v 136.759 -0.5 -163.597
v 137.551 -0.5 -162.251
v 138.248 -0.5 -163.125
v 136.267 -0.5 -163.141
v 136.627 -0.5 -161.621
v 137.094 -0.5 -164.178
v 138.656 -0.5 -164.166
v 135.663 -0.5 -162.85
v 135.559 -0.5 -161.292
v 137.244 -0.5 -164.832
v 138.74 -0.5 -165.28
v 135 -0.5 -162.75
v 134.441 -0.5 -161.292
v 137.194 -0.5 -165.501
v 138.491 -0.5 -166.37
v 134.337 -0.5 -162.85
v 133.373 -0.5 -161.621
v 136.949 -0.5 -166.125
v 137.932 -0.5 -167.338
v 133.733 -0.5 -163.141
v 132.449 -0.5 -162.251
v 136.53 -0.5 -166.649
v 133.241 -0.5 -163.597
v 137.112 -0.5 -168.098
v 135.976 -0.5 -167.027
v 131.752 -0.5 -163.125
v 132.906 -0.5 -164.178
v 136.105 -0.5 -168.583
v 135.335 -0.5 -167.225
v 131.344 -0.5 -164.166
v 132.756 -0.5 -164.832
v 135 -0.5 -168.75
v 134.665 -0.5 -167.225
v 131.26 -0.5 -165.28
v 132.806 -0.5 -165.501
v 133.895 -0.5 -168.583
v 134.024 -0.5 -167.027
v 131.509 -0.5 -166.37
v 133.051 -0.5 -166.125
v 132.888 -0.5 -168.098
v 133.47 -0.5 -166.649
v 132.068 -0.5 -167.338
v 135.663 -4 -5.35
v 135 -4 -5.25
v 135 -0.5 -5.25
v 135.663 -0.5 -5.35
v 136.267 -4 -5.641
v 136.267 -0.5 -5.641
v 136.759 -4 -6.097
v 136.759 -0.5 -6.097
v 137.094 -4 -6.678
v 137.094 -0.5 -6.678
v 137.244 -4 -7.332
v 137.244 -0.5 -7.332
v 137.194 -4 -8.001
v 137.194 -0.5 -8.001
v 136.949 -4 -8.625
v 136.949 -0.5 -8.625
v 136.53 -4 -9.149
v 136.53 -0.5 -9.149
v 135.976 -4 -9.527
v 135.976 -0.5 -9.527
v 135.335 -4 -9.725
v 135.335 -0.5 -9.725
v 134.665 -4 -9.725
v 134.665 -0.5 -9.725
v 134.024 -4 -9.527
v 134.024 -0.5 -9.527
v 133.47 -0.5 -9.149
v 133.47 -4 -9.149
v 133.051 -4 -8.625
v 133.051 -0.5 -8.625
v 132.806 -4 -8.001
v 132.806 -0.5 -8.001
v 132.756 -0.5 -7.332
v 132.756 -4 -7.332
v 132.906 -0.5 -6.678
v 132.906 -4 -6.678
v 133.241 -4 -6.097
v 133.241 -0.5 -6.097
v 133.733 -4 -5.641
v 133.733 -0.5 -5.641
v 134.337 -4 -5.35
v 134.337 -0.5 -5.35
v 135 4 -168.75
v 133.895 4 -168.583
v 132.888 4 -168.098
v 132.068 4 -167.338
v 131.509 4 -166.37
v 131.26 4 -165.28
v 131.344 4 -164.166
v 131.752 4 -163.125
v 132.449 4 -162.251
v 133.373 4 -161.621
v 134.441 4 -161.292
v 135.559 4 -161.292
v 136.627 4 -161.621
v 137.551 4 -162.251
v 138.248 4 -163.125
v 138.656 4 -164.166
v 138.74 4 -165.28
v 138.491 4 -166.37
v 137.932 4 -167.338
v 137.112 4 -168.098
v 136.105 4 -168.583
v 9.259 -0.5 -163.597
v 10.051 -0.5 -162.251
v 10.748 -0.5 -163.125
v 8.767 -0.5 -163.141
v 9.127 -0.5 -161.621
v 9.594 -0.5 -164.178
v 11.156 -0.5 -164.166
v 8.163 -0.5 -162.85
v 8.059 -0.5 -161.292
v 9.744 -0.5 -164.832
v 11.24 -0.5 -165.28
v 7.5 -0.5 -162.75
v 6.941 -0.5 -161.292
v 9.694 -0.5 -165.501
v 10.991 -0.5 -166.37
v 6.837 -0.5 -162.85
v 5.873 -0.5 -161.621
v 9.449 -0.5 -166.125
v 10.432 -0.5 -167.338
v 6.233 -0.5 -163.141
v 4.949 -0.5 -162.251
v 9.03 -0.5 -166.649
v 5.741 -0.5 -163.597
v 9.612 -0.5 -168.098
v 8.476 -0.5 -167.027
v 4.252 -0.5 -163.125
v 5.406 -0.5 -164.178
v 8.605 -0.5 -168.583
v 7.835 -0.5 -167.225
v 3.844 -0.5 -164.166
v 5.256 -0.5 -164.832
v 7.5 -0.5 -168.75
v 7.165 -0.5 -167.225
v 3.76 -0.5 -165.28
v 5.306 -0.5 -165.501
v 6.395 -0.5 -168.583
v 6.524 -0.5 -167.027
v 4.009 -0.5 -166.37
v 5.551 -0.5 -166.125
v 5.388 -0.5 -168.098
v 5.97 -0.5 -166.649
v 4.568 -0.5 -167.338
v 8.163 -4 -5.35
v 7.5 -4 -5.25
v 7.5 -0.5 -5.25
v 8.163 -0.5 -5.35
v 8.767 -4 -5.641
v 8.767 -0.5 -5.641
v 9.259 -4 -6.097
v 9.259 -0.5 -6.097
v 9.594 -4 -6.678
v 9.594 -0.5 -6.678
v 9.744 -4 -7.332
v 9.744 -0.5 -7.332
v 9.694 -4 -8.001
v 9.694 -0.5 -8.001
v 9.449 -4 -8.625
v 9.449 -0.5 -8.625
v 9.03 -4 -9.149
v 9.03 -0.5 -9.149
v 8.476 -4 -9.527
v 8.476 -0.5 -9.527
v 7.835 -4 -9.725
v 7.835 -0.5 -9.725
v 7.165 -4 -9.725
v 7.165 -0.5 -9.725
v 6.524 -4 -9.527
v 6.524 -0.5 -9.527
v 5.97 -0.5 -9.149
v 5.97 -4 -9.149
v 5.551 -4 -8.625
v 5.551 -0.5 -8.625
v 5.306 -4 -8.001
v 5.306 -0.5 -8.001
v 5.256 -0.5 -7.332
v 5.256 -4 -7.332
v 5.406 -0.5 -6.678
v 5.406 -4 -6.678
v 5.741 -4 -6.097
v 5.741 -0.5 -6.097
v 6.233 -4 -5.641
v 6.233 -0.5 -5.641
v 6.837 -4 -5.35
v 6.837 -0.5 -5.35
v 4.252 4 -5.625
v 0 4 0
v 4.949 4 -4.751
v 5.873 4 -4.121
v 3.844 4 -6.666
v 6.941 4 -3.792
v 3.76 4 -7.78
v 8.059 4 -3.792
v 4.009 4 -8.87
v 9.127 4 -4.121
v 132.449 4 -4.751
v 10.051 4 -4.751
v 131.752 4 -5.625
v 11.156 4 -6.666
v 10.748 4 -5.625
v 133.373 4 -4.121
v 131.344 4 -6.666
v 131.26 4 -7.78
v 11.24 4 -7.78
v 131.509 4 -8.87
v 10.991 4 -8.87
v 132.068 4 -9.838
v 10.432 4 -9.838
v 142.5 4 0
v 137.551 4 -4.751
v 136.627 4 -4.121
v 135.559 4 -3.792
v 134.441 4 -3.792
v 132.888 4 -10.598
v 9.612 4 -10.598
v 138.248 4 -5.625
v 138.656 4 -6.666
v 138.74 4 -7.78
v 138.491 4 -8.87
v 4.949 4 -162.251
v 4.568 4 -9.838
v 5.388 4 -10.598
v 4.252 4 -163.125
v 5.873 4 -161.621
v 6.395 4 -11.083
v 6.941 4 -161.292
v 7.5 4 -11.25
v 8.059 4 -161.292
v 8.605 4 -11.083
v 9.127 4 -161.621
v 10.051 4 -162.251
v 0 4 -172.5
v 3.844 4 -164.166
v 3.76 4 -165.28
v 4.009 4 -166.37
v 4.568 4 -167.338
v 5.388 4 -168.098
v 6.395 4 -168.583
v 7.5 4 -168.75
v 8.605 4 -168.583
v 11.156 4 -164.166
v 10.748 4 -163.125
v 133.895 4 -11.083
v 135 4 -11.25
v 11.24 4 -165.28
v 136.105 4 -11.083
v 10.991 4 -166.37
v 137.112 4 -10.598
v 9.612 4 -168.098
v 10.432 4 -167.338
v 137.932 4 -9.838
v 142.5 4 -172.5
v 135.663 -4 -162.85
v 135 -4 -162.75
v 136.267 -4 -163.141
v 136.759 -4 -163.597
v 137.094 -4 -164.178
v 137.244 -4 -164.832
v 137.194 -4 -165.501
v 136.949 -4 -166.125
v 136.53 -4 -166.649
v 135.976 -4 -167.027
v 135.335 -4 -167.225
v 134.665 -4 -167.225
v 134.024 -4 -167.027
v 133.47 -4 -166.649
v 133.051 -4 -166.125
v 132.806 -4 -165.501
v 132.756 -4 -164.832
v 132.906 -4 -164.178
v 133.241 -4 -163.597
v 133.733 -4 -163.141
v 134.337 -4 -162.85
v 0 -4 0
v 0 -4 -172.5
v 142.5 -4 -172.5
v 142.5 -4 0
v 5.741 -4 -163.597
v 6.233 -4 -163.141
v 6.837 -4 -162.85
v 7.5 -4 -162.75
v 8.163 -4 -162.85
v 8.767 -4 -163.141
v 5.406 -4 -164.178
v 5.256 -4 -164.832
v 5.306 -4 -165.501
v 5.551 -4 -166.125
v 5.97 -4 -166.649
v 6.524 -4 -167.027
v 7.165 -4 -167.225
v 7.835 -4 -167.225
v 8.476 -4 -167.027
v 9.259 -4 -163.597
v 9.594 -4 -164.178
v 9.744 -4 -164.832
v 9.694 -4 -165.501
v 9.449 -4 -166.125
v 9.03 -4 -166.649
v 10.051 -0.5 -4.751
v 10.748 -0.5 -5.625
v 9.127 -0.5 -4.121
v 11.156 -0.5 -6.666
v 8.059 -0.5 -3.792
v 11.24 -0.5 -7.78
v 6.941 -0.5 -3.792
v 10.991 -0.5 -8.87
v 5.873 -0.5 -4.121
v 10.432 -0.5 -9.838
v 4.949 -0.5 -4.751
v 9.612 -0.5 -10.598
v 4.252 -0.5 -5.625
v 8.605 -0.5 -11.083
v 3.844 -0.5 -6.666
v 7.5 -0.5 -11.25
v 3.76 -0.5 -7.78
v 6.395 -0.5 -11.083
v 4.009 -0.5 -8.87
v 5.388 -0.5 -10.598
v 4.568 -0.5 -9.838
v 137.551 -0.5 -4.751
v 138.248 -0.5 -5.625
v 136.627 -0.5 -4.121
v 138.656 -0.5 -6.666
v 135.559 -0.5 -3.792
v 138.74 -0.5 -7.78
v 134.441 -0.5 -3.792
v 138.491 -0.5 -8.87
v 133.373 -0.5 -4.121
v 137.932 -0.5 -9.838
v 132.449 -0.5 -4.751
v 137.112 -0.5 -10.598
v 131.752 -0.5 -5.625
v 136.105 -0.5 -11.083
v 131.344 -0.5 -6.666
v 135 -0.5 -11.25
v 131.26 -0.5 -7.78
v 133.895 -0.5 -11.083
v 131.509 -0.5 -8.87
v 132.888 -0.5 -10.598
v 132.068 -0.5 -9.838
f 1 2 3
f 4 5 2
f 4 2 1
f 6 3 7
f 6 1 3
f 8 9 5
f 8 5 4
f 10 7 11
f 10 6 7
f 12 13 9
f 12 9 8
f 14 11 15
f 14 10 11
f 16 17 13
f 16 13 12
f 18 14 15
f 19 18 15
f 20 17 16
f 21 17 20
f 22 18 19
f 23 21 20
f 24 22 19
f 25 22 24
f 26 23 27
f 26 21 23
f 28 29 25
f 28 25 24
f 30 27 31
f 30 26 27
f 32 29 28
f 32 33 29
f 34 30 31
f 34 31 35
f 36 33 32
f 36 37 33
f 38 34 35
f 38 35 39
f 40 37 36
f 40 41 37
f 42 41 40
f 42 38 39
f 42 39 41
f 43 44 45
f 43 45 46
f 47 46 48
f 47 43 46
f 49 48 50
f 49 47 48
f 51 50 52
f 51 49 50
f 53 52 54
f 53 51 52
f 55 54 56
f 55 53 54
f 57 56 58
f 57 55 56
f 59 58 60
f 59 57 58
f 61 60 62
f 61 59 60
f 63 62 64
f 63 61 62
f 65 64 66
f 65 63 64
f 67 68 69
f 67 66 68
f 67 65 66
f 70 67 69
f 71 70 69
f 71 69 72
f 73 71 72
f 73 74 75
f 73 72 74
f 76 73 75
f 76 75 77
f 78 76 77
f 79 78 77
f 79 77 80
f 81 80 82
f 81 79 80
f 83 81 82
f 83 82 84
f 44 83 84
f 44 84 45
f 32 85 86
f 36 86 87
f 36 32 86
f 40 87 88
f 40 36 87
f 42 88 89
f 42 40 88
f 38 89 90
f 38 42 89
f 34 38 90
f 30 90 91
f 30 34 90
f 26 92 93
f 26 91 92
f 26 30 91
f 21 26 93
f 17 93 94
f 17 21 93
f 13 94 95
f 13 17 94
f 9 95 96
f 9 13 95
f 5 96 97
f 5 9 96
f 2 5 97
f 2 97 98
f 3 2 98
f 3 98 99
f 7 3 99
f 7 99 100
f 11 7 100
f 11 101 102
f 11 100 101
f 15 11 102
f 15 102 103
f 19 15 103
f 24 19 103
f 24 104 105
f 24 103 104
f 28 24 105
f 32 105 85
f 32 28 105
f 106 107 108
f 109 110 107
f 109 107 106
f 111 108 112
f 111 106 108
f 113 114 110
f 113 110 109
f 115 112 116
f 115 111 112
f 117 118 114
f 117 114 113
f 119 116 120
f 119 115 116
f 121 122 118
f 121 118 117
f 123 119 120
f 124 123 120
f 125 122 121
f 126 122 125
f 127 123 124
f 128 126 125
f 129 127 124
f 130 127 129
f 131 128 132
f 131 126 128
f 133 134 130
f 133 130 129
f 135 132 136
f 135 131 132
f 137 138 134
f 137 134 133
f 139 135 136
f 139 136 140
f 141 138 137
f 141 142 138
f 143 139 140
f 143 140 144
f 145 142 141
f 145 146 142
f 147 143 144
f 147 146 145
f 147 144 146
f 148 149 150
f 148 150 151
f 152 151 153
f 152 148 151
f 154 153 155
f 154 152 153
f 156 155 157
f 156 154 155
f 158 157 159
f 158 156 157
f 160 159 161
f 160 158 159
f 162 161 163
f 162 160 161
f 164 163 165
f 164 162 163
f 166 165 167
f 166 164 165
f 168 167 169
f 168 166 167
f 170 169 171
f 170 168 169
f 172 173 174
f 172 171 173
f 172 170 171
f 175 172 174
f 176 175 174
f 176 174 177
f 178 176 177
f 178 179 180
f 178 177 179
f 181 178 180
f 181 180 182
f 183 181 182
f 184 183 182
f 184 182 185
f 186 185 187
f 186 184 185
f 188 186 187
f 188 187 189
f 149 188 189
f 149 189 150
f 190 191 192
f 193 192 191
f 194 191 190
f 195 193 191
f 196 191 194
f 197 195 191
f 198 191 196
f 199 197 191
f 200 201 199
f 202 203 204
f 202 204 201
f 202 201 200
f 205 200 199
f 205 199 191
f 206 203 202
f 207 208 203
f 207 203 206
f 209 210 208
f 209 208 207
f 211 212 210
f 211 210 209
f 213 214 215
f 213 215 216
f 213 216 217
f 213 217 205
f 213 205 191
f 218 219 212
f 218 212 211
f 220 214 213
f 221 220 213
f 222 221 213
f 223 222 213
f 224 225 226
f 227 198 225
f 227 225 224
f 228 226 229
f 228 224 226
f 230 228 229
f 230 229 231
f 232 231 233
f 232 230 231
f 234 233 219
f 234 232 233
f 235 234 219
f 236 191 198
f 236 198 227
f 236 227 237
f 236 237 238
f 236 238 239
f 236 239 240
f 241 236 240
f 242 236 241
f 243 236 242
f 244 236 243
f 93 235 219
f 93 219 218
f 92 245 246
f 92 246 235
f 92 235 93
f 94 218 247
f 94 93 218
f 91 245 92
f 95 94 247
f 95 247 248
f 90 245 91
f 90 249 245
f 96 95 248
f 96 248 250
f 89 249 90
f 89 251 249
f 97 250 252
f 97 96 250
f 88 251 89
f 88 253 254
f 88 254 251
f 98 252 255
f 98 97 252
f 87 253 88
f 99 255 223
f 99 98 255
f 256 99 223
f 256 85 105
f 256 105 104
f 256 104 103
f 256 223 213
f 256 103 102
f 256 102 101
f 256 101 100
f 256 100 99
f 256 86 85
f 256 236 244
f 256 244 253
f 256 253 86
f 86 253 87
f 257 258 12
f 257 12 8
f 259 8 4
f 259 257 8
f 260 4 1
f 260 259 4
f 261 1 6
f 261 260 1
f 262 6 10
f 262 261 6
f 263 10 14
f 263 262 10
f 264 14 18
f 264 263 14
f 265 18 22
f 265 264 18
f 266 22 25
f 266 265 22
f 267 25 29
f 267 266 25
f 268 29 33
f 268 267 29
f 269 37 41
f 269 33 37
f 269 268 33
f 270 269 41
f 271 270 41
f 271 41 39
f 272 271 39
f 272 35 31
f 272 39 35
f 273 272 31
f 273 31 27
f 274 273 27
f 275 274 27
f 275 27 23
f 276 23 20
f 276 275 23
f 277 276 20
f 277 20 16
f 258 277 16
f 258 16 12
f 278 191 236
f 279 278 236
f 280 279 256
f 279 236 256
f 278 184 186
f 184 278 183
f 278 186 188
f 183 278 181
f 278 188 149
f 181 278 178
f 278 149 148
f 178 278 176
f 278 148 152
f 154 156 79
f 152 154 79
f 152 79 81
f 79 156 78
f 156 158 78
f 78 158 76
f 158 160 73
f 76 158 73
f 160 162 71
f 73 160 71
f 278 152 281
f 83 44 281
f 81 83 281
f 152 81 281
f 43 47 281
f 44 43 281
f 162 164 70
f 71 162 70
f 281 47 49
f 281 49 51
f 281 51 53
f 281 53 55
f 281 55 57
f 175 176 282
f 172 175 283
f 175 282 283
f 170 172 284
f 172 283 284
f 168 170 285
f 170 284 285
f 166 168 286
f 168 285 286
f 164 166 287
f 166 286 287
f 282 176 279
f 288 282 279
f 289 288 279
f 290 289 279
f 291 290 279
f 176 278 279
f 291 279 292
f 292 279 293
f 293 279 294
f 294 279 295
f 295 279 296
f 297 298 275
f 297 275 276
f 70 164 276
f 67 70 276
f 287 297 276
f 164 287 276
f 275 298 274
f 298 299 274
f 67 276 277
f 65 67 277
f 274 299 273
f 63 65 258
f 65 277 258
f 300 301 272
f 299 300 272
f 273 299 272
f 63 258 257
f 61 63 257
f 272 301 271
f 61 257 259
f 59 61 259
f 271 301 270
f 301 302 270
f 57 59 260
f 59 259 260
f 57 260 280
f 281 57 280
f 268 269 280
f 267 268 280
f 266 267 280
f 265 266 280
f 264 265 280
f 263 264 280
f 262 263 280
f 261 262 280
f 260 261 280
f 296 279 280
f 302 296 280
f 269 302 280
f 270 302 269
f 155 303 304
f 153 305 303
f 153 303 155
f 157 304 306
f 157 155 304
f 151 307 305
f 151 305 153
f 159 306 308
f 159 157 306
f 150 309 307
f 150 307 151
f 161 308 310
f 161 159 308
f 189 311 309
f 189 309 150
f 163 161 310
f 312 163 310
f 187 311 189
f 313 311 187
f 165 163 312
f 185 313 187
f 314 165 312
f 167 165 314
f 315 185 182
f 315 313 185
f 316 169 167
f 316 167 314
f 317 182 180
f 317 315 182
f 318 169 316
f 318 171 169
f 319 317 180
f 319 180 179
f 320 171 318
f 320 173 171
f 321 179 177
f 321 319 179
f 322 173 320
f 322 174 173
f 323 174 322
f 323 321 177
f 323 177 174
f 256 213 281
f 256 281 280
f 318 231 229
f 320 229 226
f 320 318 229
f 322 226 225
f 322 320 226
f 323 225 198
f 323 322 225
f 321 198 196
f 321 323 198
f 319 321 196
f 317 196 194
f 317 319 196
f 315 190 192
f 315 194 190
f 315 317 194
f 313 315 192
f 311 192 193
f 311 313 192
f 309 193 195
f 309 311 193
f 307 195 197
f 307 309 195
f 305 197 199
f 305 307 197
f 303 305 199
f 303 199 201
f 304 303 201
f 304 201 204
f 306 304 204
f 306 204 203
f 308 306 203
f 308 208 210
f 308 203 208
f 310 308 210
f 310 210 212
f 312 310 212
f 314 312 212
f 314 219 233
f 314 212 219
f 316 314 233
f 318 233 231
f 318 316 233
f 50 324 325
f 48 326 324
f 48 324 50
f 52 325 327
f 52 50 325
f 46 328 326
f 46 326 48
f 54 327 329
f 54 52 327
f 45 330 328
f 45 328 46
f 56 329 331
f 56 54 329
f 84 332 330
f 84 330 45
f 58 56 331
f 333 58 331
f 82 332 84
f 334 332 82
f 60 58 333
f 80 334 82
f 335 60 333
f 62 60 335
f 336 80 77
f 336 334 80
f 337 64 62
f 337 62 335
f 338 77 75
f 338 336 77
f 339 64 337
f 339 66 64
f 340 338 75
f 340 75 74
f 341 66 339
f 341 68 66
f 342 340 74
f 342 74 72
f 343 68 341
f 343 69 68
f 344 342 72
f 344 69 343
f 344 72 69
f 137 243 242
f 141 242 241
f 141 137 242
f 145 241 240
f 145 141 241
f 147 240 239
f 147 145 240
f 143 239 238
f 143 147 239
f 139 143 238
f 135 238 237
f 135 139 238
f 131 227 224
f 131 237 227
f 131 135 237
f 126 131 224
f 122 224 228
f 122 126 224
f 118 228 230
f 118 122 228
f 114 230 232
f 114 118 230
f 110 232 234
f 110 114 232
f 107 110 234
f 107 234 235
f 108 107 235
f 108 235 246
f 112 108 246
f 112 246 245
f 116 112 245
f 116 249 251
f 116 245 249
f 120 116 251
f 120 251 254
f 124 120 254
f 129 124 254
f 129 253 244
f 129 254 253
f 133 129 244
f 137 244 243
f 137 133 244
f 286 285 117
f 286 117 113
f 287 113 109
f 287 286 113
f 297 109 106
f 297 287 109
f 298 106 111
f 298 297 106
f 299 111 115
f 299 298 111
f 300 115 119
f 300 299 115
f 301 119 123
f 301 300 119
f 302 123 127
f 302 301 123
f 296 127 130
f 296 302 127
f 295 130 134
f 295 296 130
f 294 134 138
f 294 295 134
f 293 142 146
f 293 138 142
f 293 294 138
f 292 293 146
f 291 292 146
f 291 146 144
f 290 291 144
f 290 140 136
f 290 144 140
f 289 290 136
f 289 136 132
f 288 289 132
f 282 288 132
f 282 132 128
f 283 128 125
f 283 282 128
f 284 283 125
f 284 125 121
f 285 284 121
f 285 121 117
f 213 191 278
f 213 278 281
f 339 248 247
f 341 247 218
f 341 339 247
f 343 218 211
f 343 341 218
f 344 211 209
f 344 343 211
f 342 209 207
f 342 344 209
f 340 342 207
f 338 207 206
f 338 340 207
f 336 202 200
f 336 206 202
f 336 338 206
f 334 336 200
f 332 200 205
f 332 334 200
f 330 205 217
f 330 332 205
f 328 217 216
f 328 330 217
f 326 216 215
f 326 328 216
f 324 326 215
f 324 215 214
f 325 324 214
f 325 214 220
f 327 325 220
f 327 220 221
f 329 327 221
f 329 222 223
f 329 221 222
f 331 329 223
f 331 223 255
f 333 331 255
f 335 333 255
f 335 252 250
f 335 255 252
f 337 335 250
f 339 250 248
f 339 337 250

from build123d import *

# Parameters (mm, degrees)
SKETCH1_W               = 142.5
SKETCH1_H               = 172.5
BOSS_EXTRUDE1_DEPTH     = 4
CUT_EXTRUDE1_DEPTH      = 224.889481665
CUT_EXTRUDE1_DEPTH_BACK = 224.889481665
SKETCH2_R               = 2.25
CUT_EXTRUDE2_DEPTH      = 224.889481665
CUT_EXTRUDE2_DEPTH_BACK = 4.5
SKETCH3_R               = 3.75


with BuildPart() as part:
    # Sketch1 → Boss-Extrude1 (new, symmetric)
    with BuildSketch(Plane(origin=(0, 0, 0), x_dir=(1, 0, 0), z_dir=(0, 1, 0))):
        with Locations((71.25, 86.25)):
            Rectangle(SKETCH1_W, SKETCH1_H)
    extrude(amount=BOSS_EXTRUDE1_DEPTH, both=True)

    # Sketch2 → Cut-Extrude1 (cut, two sides: drawn at the far end of the back side and taken through both)
    with BuildSketch(Plane(origin=(0, 4, 0), x_dir=(1, 0, 0), z_dir=(0, 1, 0)).offset(-CUT_EXTRUDE1_DEPTH_BACK)):
        with Locations(Location((7.5, 165, 0), (0, 0, 270))):
            Circle(SKETCH2_R)
        with Locations(Location((135, 165, 0), (0, 0, 270))):
            Circle(SKETCH2_R)
        with Locations(Location((135, 7.5, 0), (0, 0, 270))):
            Circle(SKETCH2_R)
        with Locations(Location((7.5, 7.5, 0), (0, 0, 270))):
            Circle(SKETCH2_R)
    extrude(amount=CUT_EXTRUDE1_DEPTH + CUT_EXTRUDE1_DEPTH_BACK, mode=Mode.SUBTRACT)

    # Sketch3 → Cut-Extrude2 (cut, two sides: drawn at the far end of the back side and taken through both)
    with BuildSketch(Plane(origin=(0, 4, 0), x_dir=(1, 0, 0), z_dir=(0, 1, 0)).offset(-CUT_EXTRUDE2_DEPTH_BACK)):
        with Locations(Location((7.5, 165, 0), (0, 0, 90))):
            Circle(SKETCH3_R)
        with Locations(Location((135, 165, 0), (0, 0, 90))):
            Circle(SKETCH3_R)
        with Locations(Location((135, 7.5, 0), (0, 0, 90))):
            Circle(SKETCH3_R)
        with Locations(Location((7.5, 7.5, 0), (0, 0, 90))):
            Circle(SKETCH3_R)
    extrude(amount=CUT_EXTRUDE2_DEPTH + CUT_EXTRUDE2_DEPTH_BACK, mode=Mode.SUBTRACT)


solid = part.part
